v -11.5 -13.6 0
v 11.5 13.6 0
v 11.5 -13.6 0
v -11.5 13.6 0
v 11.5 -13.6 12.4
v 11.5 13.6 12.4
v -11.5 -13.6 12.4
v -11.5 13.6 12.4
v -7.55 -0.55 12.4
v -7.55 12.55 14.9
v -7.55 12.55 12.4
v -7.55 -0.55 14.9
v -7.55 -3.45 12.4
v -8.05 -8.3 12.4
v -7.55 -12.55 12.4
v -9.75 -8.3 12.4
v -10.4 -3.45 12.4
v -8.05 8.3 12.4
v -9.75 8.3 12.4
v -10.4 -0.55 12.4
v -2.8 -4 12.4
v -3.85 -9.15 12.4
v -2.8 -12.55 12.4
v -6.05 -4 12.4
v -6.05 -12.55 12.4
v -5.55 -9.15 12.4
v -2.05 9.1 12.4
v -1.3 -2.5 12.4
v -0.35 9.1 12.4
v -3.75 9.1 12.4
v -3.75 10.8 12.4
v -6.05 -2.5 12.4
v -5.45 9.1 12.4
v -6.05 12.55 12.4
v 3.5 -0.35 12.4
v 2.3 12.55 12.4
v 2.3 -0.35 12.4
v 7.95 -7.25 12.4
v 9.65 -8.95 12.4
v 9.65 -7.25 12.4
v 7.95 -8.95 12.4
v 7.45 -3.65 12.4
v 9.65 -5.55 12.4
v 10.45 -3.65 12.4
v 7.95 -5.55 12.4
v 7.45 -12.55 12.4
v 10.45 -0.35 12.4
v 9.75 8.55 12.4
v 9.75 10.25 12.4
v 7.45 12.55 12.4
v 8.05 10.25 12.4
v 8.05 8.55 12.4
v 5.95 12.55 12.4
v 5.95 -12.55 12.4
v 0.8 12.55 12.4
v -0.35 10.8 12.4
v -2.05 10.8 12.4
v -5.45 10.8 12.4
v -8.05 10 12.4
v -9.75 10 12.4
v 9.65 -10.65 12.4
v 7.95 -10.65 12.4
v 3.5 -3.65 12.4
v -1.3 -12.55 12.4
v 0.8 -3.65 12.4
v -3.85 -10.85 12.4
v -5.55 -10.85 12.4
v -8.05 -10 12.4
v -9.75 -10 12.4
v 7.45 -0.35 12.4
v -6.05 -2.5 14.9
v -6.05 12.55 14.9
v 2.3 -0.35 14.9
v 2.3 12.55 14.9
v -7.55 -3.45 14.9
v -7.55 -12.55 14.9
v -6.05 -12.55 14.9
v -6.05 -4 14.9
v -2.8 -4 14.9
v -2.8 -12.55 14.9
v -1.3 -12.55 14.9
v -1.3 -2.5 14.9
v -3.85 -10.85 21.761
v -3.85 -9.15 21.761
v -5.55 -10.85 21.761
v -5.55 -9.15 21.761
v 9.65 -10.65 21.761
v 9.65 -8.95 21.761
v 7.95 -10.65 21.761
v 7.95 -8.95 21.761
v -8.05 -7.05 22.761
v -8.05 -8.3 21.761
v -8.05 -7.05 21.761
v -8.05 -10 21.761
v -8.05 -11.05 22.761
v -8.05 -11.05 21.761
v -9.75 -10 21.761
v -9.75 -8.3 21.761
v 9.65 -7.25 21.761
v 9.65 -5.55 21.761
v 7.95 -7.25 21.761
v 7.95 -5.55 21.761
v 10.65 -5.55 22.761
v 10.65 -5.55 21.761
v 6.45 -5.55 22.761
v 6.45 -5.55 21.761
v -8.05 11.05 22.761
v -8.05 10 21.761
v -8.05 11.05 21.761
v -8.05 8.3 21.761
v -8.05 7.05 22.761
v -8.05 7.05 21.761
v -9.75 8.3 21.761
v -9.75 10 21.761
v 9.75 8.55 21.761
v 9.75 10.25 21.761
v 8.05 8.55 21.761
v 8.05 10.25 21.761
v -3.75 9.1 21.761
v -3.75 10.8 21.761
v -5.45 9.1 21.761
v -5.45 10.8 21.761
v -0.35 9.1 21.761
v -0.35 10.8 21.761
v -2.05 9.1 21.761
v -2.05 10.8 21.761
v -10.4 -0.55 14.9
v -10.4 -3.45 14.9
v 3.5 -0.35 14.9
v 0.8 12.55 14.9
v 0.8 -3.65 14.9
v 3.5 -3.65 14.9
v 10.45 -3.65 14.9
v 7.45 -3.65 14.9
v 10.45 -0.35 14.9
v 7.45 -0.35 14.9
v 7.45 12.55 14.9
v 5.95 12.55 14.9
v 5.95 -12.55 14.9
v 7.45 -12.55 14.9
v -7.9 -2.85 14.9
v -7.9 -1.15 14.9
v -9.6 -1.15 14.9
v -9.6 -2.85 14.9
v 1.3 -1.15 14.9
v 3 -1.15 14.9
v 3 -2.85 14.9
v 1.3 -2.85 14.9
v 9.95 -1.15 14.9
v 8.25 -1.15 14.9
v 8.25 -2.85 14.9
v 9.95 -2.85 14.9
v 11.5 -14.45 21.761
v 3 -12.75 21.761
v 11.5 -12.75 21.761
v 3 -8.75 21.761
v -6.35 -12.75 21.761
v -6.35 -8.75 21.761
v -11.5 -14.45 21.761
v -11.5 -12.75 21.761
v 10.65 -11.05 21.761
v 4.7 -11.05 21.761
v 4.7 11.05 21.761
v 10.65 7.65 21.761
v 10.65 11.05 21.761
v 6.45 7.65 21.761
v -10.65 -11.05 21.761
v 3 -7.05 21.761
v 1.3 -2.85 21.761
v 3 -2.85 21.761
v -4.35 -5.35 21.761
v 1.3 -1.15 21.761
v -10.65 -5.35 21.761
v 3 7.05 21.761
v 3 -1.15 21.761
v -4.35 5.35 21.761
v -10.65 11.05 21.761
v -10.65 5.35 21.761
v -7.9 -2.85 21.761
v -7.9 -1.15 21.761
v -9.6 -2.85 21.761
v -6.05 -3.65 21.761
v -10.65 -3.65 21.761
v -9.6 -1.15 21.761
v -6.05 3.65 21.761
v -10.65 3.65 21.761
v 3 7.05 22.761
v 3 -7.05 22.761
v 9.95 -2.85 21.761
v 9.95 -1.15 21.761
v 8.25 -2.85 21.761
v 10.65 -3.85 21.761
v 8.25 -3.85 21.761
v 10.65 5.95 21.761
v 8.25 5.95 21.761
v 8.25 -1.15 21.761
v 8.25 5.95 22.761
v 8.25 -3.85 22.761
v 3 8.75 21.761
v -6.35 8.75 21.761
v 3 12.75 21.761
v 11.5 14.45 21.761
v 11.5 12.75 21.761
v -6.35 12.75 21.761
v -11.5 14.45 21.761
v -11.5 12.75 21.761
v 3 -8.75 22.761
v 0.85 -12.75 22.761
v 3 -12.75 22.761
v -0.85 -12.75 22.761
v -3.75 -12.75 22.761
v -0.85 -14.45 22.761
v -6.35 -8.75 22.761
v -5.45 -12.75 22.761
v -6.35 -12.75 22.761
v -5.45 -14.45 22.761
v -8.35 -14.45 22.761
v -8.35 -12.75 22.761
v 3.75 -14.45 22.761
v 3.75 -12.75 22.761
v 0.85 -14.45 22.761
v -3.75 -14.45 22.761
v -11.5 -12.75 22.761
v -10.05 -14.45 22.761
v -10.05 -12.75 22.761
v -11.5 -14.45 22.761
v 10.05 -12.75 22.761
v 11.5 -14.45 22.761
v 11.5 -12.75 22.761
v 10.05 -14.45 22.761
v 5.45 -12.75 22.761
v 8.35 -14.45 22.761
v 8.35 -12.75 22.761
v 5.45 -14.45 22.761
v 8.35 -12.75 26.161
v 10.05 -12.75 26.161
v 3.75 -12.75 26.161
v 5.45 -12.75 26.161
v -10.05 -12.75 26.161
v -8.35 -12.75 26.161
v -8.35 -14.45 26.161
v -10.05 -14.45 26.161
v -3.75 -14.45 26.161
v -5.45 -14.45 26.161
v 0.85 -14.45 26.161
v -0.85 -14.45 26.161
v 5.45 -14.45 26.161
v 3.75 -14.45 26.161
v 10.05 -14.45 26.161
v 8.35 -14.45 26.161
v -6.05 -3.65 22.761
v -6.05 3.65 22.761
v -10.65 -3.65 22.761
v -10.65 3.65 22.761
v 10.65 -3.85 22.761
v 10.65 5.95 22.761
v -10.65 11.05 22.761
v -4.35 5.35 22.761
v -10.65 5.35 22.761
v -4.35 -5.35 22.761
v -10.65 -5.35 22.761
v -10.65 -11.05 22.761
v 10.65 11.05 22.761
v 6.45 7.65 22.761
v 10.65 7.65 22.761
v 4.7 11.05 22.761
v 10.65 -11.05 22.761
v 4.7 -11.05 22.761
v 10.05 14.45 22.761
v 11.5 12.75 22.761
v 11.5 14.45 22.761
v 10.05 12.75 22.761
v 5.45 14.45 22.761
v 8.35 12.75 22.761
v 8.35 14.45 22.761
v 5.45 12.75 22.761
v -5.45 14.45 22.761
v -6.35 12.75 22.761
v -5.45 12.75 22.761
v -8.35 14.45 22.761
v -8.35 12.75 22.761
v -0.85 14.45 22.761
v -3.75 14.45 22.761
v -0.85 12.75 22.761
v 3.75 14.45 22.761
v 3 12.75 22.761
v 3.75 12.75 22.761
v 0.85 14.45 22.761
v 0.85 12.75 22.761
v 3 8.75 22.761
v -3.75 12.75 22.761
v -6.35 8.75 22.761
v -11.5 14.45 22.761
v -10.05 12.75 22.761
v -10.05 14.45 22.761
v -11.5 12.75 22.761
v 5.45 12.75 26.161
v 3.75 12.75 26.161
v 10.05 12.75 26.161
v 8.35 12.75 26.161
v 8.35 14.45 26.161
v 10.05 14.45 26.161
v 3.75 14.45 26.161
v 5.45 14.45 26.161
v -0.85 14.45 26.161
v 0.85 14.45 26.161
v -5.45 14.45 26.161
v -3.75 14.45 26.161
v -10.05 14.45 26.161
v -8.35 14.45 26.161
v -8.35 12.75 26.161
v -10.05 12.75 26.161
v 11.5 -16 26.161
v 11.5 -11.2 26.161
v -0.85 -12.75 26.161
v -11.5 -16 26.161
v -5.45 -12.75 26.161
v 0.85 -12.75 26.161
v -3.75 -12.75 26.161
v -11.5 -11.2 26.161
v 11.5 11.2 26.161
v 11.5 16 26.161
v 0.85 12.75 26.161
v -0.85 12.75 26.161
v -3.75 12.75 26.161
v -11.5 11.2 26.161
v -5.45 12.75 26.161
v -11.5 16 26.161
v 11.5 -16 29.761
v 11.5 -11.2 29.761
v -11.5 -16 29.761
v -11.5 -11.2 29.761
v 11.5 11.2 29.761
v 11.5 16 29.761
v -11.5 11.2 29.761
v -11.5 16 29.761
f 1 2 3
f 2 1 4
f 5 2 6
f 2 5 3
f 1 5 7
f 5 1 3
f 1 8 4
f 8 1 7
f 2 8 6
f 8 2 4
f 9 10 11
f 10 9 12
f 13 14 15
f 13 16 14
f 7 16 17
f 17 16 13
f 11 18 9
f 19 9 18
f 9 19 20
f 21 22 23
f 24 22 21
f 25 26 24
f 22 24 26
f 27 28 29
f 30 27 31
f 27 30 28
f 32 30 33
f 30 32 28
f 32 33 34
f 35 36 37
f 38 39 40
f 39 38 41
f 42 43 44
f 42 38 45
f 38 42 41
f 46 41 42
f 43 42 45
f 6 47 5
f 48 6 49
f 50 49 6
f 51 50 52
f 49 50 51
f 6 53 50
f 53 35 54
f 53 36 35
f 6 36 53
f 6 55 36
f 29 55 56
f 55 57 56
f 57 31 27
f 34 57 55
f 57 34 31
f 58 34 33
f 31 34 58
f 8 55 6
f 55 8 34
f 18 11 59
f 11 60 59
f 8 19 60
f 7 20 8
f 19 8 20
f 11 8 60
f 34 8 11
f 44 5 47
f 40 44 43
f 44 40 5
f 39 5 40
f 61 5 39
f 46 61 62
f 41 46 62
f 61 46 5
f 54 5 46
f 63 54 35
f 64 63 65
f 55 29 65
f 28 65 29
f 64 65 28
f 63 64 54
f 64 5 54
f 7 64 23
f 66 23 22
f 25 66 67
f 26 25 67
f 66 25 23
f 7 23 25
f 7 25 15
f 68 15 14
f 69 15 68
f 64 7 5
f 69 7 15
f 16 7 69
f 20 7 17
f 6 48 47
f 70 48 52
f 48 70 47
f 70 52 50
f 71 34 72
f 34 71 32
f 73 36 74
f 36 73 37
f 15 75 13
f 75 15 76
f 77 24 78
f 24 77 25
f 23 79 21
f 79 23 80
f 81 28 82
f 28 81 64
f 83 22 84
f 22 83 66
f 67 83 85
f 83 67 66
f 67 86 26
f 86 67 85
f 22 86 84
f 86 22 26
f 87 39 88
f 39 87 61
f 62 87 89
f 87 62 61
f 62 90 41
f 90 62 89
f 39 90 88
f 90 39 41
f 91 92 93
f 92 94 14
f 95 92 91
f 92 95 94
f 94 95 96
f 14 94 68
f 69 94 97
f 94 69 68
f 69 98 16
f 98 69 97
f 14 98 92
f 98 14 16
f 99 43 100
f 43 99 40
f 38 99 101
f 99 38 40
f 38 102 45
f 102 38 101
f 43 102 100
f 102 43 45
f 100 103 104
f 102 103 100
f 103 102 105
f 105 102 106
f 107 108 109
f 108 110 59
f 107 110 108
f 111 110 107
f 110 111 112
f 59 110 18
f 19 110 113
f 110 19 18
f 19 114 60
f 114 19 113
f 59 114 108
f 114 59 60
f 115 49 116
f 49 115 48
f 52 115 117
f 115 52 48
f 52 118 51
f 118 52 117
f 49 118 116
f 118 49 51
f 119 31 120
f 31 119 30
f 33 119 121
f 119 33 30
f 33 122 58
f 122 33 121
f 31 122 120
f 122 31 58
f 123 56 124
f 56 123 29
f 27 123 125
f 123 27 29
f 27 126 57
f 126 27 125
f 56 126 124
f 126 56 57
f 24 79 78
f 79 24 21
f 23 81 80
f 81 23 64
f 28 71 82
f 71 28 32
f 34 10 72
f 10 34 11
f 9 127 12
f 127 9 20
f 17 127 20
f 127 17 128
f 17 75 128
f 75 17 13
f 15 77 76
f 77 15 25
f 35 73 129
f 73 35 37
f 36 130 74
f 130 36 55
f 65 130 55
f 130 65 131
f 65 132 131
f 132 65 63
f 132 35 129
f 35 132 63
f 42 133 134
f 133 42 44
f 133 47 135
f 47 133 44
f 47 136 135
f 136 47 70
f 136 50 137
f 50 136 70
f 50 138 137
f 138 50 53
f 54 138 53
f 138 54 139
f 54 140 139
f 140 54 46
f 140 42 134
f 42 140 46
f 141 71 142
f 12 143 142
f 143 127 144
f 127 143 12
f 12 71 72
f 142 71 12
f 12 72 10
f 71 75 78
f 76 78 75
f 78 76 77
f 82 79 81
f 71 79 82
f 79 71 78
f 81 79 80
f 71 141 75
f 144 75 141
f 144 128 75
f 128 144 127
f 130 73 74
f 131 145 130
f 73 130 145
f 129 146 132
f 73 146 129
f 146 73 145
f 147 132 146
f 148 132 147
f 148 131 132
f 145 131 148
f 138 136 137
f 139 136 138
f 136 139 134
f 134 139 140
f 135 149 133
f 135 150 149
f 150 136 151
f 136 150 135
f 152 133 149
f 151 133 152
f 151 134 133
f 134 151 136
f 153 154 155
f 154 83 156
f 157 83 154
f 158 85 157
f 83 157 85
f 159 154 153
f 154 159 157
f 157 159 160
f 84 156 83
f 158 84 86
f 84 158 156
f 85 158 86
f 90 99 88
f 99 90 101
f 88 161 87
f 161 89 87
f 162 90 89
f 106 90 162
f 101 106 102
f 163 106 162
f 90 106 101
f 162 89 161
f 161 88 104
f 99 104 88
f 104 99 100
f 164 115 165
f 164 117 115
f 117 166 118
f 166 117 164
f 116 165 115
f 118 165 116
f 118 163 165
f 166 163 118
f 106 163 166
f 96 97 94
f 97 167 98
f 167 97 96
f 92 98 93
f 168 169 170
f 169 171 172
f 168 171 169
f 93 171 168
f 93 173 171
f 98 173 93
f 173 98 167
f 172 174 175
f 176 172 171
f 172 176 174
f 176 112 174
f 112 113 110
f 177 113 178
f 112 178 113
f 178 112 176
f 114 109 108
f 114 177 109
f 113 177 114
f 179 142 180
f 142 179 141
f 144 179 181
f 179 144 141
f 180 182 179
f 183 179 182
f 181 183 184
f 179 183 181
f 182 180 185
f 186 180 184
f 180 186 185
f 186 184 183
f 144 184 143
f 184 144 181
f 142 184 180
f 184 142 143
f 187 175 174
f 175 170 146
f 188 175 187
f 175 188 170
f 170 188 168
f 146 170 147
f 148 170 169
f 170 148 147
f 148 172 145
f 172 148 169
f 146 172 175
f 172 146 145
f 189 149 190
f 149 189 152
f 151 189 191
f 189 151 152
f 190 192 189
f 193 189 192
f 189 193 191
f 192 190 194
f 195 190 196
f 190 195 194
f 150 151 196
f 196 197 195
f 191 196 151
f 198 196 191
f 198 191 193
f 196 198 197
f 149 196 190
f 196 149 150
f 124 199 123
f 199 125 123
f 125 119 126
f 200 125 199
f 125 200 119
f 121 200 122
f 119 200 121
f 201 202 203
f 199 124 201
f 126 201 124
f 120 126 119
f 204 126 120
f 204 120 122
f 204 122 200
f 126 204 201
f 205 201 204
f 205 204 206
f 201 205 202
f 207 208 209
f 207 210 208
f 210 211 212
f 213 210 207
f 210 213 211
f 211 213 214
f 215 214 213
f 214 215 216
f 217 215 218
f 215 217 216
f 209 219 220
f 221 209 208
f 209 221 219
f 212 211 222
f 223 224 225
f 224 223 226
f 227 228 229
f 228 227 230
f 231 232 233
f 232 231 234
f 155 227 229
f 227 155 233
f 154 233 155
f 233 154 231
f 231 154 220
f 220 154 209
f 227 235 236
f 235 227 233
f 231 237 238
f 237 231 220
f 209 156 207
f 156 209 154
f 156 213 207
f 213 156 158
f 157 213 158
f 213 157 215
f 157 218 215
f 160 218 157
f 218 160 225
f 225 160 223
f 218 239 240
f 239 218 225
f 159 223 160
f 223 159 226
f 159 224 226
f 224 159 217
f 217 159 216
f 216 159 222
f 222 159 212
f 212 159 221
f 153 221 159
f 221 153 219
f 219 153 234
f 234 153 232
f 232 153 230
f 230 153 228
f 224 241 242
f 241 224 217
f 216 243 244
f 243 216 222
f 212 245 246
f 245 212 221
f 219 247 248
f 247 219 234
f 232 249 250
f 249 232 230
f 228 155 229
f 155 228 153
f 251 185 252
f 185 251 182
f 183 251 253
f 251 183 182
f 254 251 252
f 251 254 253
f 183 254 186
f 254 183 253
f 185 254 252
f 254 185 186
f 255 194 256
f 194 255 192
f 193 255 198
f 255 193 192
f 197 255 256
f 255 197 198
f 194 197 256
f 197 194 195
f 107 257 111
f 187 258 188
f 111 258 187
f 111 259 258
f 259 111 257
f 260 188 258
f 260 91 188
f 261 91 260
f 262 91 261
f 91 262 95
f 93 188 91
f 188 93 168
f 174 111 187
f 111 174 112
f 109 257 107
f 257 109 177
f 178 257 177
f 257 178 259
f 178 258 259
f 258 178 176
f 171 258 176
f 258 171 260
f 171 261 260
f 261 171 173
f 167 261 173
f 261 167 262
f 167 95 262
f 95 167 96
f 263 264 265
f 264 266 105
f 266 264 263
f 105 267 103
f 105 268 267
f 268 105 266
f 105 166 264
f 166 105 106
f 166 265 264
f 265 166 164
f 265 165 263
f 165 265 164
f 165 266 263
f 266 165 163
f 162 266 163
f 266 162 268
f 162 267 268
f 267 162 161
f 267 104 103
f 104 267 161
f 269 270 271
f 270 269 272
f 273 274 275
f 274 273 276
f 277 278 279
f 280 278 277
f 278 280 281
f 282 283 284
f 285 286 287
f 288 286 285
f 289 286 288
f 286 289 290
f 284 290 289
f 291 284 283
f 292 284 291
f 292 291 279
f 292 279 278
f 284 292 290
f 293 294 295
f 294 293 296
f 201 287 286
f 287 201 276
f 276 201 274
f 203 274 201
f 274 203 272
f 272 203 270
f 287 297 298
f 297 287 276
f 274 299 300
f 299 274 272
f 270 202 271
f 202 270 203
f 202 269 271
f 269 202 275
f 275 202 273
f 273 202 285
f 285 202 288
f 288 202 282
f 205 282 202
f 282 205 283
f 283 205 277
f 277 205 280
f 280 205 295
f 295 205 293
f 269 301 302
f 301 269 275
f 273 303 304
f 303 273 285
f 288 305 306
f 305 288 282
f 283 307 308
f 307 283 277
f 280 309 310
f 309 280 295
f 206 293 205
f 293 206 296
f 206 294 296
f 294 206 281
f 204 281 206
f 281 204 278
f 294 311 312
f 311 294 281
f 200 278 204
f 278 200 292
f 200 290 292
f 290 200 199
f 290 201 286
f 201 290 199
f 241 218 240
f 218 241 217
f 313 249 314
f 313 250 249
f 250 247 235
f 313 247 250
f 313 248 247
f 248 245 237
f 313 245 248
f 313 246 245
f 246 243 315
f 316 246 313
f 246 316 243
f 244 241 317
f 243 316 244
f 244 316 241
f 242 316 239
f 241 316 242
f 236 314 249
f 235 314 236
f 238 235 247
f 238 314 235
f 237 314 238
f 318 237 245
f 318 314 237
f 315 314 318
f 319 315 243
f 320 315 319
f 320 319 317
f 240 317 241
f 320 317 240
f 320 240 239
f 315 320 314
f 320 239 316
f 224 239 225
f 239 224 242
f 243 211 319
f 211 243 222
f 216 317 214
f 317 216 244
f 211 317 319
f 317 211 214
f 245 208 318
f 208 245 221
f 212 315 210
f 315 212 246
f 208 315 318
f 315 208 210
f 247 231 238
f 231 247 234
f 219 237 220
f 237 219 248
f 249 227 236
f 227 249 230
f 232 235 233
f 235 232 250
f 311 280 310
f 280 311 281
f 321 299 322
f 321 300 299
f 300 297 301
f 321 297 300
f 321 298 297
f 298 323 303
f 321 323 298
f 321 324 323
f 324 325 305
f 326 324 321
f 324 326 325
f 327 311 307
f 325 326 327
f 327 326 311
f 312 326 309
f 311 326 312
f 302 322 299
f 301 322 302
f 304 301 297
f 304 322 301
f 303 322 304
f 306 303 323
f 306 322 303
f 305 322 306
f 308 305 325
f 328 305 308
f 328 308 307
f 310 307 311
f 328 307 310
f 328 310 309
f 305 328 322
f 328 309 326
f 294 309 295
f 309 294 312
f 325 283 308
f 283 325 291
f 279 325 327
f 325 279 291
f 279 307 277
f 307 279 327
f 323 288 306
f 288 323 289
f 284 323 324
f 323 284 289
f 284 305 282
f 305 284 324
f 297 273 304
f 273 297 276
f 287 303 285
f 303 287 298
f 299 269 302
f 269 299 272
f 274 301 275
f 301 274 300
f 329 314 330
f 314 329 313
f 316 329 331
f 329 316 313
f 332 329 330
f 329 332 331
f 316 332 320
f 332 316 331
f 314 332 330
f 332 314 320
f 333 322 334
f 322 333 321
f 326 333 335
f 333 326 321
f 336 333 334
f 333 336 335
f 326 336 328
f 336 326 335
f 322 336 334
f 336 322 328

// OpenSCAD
// Generated by SolidPython 0.4.2 on 2020-09-29 23:20:50
//!OpenSCAD

scale(v = 0.0100000000) {
	translate(v = [-1150, -1360, 0]) {
		union() {
			color(c = [0.4000000000, 0.4000000000, 0.4000000000]) {
				translate(v = [0, 0, 0]) {
					linear_extrude(height = 1000.0000000000) {
						polygon(paths = [[0, 1, 2, 3]], points = [[0, 0], [0, 2720], [2300, 2720], [2300, 0]]);
					}
				}
			}
			color(c = [0.2000000000, 0.6000000000, 0.2000000000]) {
				translate(v = [0, 0, 1000.0000000000]) {
					linear_extrude(height = 120.0000000000) {
						polygon(paths = [[0, 1, 2, 3]], points = [[0, 1305], [0, 2720], [2300, 2720], [2300, 1305]]);
					}
				}
			}
			color(c = [0.4000000000, 0.4000000000, 0.4000000000]) {
				translate(v = [0, 0, 1000.0000000000]) {
					linear_extrude(height = 120.0000000000) {
						polygon(paths = [[0, 1, 2, 3]], points = [[0, 0], [0, 1305], [2300, 1305], [2300, 0]]);
					}
				}
			}
			color(c = [0.9000000000, 0.6000000000, 0.6000000000]) {
				translate(v = [0, 0, 1120.0000000000]) {
					linear_extrude(height = 120.0000000000) {
						polygon(paths = [[0, 1, 2, 3]], points = [[135, 2065], [135, 2485], [395, 2485], [395, 2065]]);
					}
				}
			}
			color(c = [0.9000000000, 0.6000000000, 0.6000000000]) {
				translate(v = [0, 0, 1120.0000000000]) {
					linear_extrude(height = 120.0000000000) {
						polygon(paths = [[0, 1, 2, 3, 4, 5]], points = [[620, 1485], [620, 2065], [545, 2065], [545, 2485], [1230, 2485], [1230, 1485]]);
					}
				}
			}
			color(c = [0.9000000000, 0.6000000000, 0.6000000000]) {
				translate(v = [0, 0, 1120.0000000000]) {
					linear_extrude(height = 120.0000000000) {
						polygon(paths = [[0, 1, 2, 3]], points = [[1380, 1485], [1380, 2485], [1745, 2485], [1745, 1485]]);
					}
				}
			}
			color(c = [0.9000000000, 0.6000000000, 0.6000000000]) {
				translate(v = [0, 0, 1120.0000000000]) {
					linear_extrude(height = 120.0000000000) {
						polygon(paths = [[0, 1, 2, 3]], points = [[1895, 1485], [1895, 2485], [2165, 2485], [2165, 1485]]);
					}
				}
			}
			color(c = [0.9000000000, 0.6000000000, 0.9000000000]) {
				translate(v = [0, 0, 1120.0000000000]) {
					linear_extrude(height = 120.0000000000) {
						polygon(paths = [[0, 1, 2, 3]], points = [[135, 235], [135, 655], [395, 655], [395, 235]]);
					}
				}
			}
			color(c = [0.9000000000, 0.6000000000, 0.9000000000]) {
				translate(v = [0, 0, 1120.0000000000]) {
					linear_extrude(height = 120.0000000000) {
						polygon(paths = [[0, 1, 2, 3, 4, 5]], points = [[545, 235], [545, 655], [620, 655], [620, 885], [870, 885], [870, 235]]);
					}
				}
			}
			color(c = [0.9000000000, 0.6000000000, 0.9000000000]) {
				translate(v = [0, 0, 1120.0000000000]) {
					linear_extrude(height = 120.0000000000) {
						polygon(paths = [[0, 1, 2, 3]], points = [[1020, 235], [1020, 885], [1745, 885], [1745, 235]]);
					}
				}
			}
			color(c = [0.9000000000, 0.6000000000, 0.9000000000]) {
				translate(v = [0, 0, 1120.0000000000]) {
					linear_extrude(height = 120.0000000000) {
						polygon(paths = [[0, 1, 2, 3]], points = [[1895, 235], [1895, 885], [2165, 885], [2165, 235]]);
					}
				}
			}
			color(c = [0.2000000000, 0.6000000000, 0.2000000000]) {
				translate(v = [0, 0, 1120.0000000000]) {
					linear_extrude(height = 120.0000000000) {
						difference() {
							polygon(paths = [[0, 1, 2, 3]], points = [[0, 1305], [0, 2720], [2300, 2720], [2300, 1305]]);
							polygon(paths = [[0, 1, 2, 3]], points = [[1380, 1485], [1745, 1485], [1745, 2485], [1380, 2485]]);
							polygon(paths = [[0, 1, 2, 3]], points = [[1895, 1485], [2165, 1485], [2165, 2485], [1895, 2485]]);
							polygon(paths = [[0, 1, 2, 3]], points = [[135, 2065], [395, 2065], [395, 2485], [135, 2485]]);
							polygon(paths = [[0, 1, 2, 3, 4, 5]], points = [[620, 1485], [1230, 1485], [1230, 2485], [545, 2485], [545, 2065], [620, 2065]]);
						}
					}
				}
			}
			color(c = [0.4000000000, 0.4000000000, 0.4000000000]) {
				translate(v = [0, 0, 1120.0000000000]) {
					linear_extrude(height = 120.0000000000) {
						difference() {
							polygon(paths = [[0, 1, 2, 3]], points = [[0, 0], [0, 1305], [2300, 1305], [2300, 0]]);
							polygon(paths = [[0, 1, 2, 3]], points = [[135, 235], [395, 235], [395, 655], [135, 655]]);
							polygon(paths = [[0, 1, 2, 3]], points = [[1020, 235], [1745, 235], [1745, 885], [1020, 885]]);
							polygon(paths = [[0, 1, 2, 3]], points = [[1895, 235], [2165, 235], [2165, 885], [1895, 885]]);
							polygon(paths = [[0, 1, 2, 3, 4, 5]], points = [[545, 235], [870, 235], [870, 885], [620, 885], [620, 655], [545, 655]]);
						}
					}
				}
			}
			color(c = [0.1000000000, 0.1000000000, 0.1000000000]) {
				translate(v = [0, 0, 1240.0000000000]) {
					linear_extrude(height = 70.0000000000) {
						polygon(paths = [[0, 1, 2, 3]], points = [[595, 275], [595, 445], [765, 445], [765, 275]]);
					}
				}
			}
			color(c = [0.1000000000, 0.1000000000, 0.1000000000]) {
				translate(v = [0, 0, 1240.0000000000]) {
					linear_extrude(height = 70.0000000000) {
						polygon(paths = [[0, 1, 2, 3]], points = [[1945, 295], [1945, 465], [2115, 465], [2115, 295]]);
					}
				}
			}
			color(c = [0.1000000000, 0.1000000000, 0.1000000000]) {
				translate(v = [0, 0, 1240.0000000000]) {
					linear_extrude(height = 70.0000000000) {
						polygon(paths = [[0, 1, 2, 3]], points = [[175, 360], [175, 530], [345, 530], [345, 360]]);
					}
				}
			}
			color(c = [0.1000000000, 0.1000000000, 0.1000000000]) {
				translate(v = [0, 0, 1240.0000000000]) {
					linear_extrude(height = 70.0000000000) {
						polygon(paths = [[0, 1, 2, 3]], points = [[1945, 635], [1945, 805], [2115, 805], [2115, 635]]);
					}
				}
			}
			color(c = [0.1000000000, 0.1000000000, 0.1000000000]) {
				translate(v = [0, 0, 1240.0000000000]) {
					linear_extrude(height = 70.0000000000) {
						polygon(paths = [[0, 1, 2, 3]], points = [[175, 2190], [175, 2360], [345, 2360], [345, 2190]]);
					}
				}
			}
			color(c = [0.1000000000, 0.1000000000, 0.1000000000]) {
				translate(v = [0, 0, 1240.0000000000]) {
					linear_extrude(height = 70.0000000000) {
						polygon(paths = [[0, 1, 2, 3]], points = [[1955, 2215], [1955, 2385], [2125, 2385], [2125, 2215]]);
					}
				}
			}
			color(c = [0.1000000000, 0.1000000000, 0.1000000000]) {
				translate(v = [0, 0, 1240.0000000000]) {
					linear_extrude(height = 70.0000000000) {
						polygon(paths = [[0, 1, 2, 3]], points = [[605, 2270], [605, 2440], [775, 2440], [775, 2270]]);
					}
				}
			}
			color(c = [0.1000000000, 0.1000000000, 0.1000000000]) {
				translate(v = [0, 0, 1240.0000000000]) {
					linear_extrude(height = 70.0000000000) {
						polygon(paths = [[0, 1, 2, 3]], points = [[945, 2270], [945, 2440], [1115, 2440], [1115, 2270]]);
					}
				}
			}
			color(c = [1.0000000000, 1.0000000000, 1.0000000000]) {
				translate(v = [0, 0, 1240.0000000000]) {
					linear_extrude(height = 70.0000000000) {
						polygon(paths = [[0, 1, 2, 3, 4, 5, 6, 7, 8, 9, 10, 11, 12, 13]], points = [[395, 105], [395, 1015], [110, 1015], [110, 1305], [395, 1305], [395, 2615], [545, 2615], [545, 1110], [1020, 1110], [1020, 105], [870, 105], [870, 960], [545, 960], [545, 105]]);
					}
				}
			}
			color(c = [1.0000000000, 1.0000000000, 1.0000000000]) {
				translate(v = [0, 0, 1240.0000000000]) {
					linear_extrude(height = 70.0000000000) {
						polygon(paths = [[0, 1, 2, 3, 4, 5]], points = [[1230, 995], [1230, 2615], [1380, 2615], [1380, 1325], [1500, 1325], [1500, 995]]);
					}
				}
			}
			color(c = [1.0000000000, 1.0000000000, 1.0000000000]) {
				translate(v = [0, 0, 1240.0000000000]) {
					linear_extrude(height = 70.0000000000) {
						polygon(paths = [[0, 1, 2, 3, 4, 5, 6, 7]], points = [[1745, 105], [1745, 2615], [1895, 2615], [1895, 1325], [2195, 1325], [2195, 995], [1895, 995], [1895, 105]]);
					}
				}
			}
			color(c = [0.1000000000, 0.1000000000, 0.1000000000]) {
				translate(v = [0, 0, 1310.0000000000]) {
					linear_extrude(height = 180.0000000000) {
						polygon(paths = [[0, 1, 2, 3]], points = [[595, 275], [595, 445], [765, 445], [765, 275]]);
					}
				}
			}
			color(c = [0.1000000000, 0.1000000000, 0.1000000000]) {
				translate(v = [0, 0, 1310.0000000000]) {
					linear_extrude(height = 180.0000000000) {
						polygon(paths = [[0, 1, 2, 3]], points = [[1945, 295], [1945, 465], [2115, 465], [2115, 295]]);
					}
				}
			}
			color(c = [0.1000000000, 0.1000000000, 0.1000000000]) {
				translate(v = [0, 0, 1310.0000000000]) {
					linear_extrude(height = 180.0000000000) {
						polygon(paths = [[0, 1, 2, 3]], points = [[175, 360], [175, 530], [345, 530], [345, 360]]);
					}
				}
			}
			color(c = [0.1000000000, 0.1000000000, 0.1000000000]) {
				translate(v = [0, 0, 1310.0000000000]) {
					linear_extrude(height = 180.0000000000) {
						polygon(paths = [[0, 1, 2, 3]], points = [[1945, 635], [1945, 805], [2115, 805], [2115, 635]]);
					}
				}
			}
			color(c = [0.1000000000, 0.1000000000, 0.1000000000]) {
				translate(v = [0, 0, 1310.0000000000]) {
					linear_extrude(height = 180.0000000000) {
						polygon(paths = [[0, 1, 2, 3]], points = [[175, 2190], [175, 2360], [345, 2360], [345, 2190]]);
					}
				}
			}
			color(c = [0.1000000000, 0.1000000000, 0.1000000000]) {
				translate(v = [0, 0, 1310.0000000000]) {
					linear_extrude(height = 180.0000000000) {
						polygon(paths = [[0, 1, 2, 3]], points = [[1955, 2215], [1955, 2385], [2125, 2385], [2125, 2215]]);
					}
				}
			}
			color(c = [0.1000000000, 0.1000000000, 0.1000000000]) {
				translate(v = [0, 0, 1310.0000000000]) {
					linear_extrude(height = 180.0000000000) {
						polygon(paths = [[0, 1, 2, 3]], points = [[605, 2270], [605, 2440], [775, 2440], [775, 2270]]);
					}
				}
			}
			color(c = [0.1000000000, 0.1000000000, 0.1000000000]) {
				translate(v = [0, 0, 1310.0000000000]) {
					linear_extrude(height = 180.0000000000) {
						polygon(paths = [[0, 1, 2, 3]], points = [[945, 2270], [945, 2440], [1115, 2440], [1115, 2270]]);
					}
				}
			}
			color(c = [0.7000000000, 0, 0]) {
				translate(v = [0, 0, 1310.0000000000]) {
					linear_extrude(height = 180.0000000000) {
						polygon(paths = [[0, 1, 2, 3, 4, 5, 6, 7, 8, 9, 10, 11, 12, 13]], points = [[395, 105], [395, 1015], [110, 1015], [110, 1305], [395, 1305], [395, 2615], [545, 2615], [545, 1110], [1020, 1110], [1020, 105], [870, 105], [870, 960], [545, 960], [545, 105]]);
					}
				}
			}
			color(c = [0.7000000000, 0, 0]) {
				translate(v = [0, 0, 1310.0000000000]) {
					linear_extrude(height = 180.0000000000) {
						polygon(paths = [[0, 1, 2, 3, 4, 5]], points = [[1230, 995], [1230, 2615], [1380, 2615], [1380, 1325], [1500, 1325], [1500, 995]]);
					}
				}
			}
			color(c = [0.7000000000, 0, 0]) {
				translate(v = [0, 0, 1310.0000000000]) {
					linear_extrude(height = 180.0000000000) {
						polygon(paths = [[0, 1, 2, 3, 4, 5, 6, 7]], points = [[1745, 105], [1745, 2615], [1895, 2615], [1895, 1325], [2195, 1325], [2195, 995], [1895, 995], [1895, 105]]);
					}
				}
			}
			color(c = [0.1000000000, 0.1000000000, 0.1000000000]) {
				translate(v = [0, 0, 1490.0000000000]) {
					linear_extrude(height = 686.1000000000) {
						polygon(paths = [[0, 1, 2, 3]], points = [[595, 275], [595, 445], [765, 445], [765, 275]]);
					}
				}
			}
			color(c = [0.1000000000, 0.1000000000, 0.1000000000]) {
				translate(v = [0, 0, 1490.0000000000]) {
					linear_extrude(height = 686.1000000000) {
						polygon(paths = [[0, 1, 2, 3]], points = [[1945, 295], [1945, 465], [2115, 465], [2115, 295]]);
					}
				}
			}
			color(c = [0.1000000000, 0.1000000000, 0.1000000000]) {
				translate(v = [0, 0, 1490.0000000000]) {
					linear_extrude(height = 686.1000000000) {
						polygon(paths = [[0, 1, 2, 3]], points = [[175, 360], [175, 530], [345, 530], [345, 360]]);
					}
				}
			}
			color(c = [0.1000000000, 0.1000000000, 0.1000000000]) {
				translate(v = [0, 0, 1490.0000000000]) {
					linear_extrude(height = 686.1000000000) {
						polygon(paths = [[0, 1, 2, 3]], points = [[1945, 635], [1945, 805], [2115, 805], [2115, 635]]);
					}
				}
			}
			color(c = [0.1000000000, 0.1000000000, 0.1000000000]) {
				translate(v = [0, 0, 1490.0000000000]) {
					linear_extrude(height = 686.1000000000) {
						polygon(paths = [[0, 1, 2, 3]], points = [[190, 1075], [190, 1245], [360, 1245], [360, 1075]]);
					}
				}
			}
			color(c = [0.1000000000, 0.1000000000, 0.1000000000]) {
				translate(v = [0, 0, 1490.0000000000]) {
					linear_extrude(height = 686.1000000000) {
						polygon(paths = [[0, 1, 2, 3]], points = [[1280, 1075], [1280, 1245], [1450, 1245], [1450, 1075]]);
					}
				}
			}
			color(c = [0.1000000000, 0.1000000000, 0.1000000000]) {
				translate(v = [0, 0, 1490.0000000000]) {
					linear_extrude(height = 686.1000000000) {
						polygon(paths = [[0, 1, 2, 3]], points = [[1975, 1075], [1975, 1245], [2145, 1245], [2145, 1075]]);
					}
				}
			}
			color(c = [0.1000000000, 0.1000000000, 0.1000000000]) {
				translate(v = [0, 0, 1490.0000000000]) {
					linear_extrude(height = 686.1000000000) {
						polygon(paths = [[0, 1, 2, 3]], points = [[175, 2190], [175, 2360], [345, 2360], [345, 2190]]);
					}
				}
			}
			color(c = [0.1000000000, 0.1000000000, 0.1000000000]) {
				translate(v = [0, 0, 1490.0000000000]) {
					linear_extrude(height = 686.1000000000) {
						polygon(paths = [[0, 1, 2, 3]], points = [[1955, 2215], [1955, 2385], [2125, 2385], [2125, 2215]]);
					}
				}
			}
			color(c = [0.1000000000, 0.1000000000, 0.1000000000]) {
				translate(v = [0, 0, 1490.0000000000]) {
					linear_extrude(height = 686.1000000000) {
						polygon(paths = [[0, 1, 2, 3]], points = [[605, 2270], [605, 2440], [775, 2440], [775, 2270]]);
					}
				}
			}
			color(c = [0.1000000000, 0.1000000000, 0.1000000000]) {
				translate(v = [0, 0, 1490.0000000000]) {
					linear_extrude(height = 686.1000000000) {
						polygon(paths = [[0, 1, 2, 3]], points = [[945, 2270], [945, 2440], [1115, 2440], [1115, 2270]]);
					}
				}
			}
			color(c = [0.9000000000, 0.6000000000, 0.6000000000]) {
				translate(v = [0, 0, 2176.1000000000]) {
					linear_extrude(height = 100.0000000000) {
						polygon(paths = [[0, 1, 2, 3, 4, 5, 6, 7]], points = [[0, -85], [0, 85], [515, 85], [515, 485], [1450, 485], [1450, 85], [2300, 85], [2300, -85]]);
					}
				}
			}
			color(c = [0.9000000000, 0.6000000000, 0.6000000000]) {
				translate(v = [0, 0, 2176.1000000000]) {
					linear_extrude(height = 100.0000000000) {
						polygon(paths = [[0, 1, 2, 3]], points = [[85, 995], [85, 1725], [545, 1725], [545, 995]]);
					}
				}
			}
			color(c = [0.9000000000, 0.6000000000, 0.6000000000]) {
				translate(v = [0, 0, 2176.1000000000]) {
					linear_extrude(height = 100.0000000000) {
						polygon(paths = [[0, 1, 2, 3]], points = [[1975, 975], [1975, 1955], [2215, 1955], [2215, 975]]);
					}
				}
			}
			color(c = [0.9000000000, 0.6000000000, 0.6000000000]) {
				translate(v = [0, 0, 2176.1000000000]) {
					linear_extrude(height = 100.0000000000) {
						polygon(paths = [[0, 1, 2, 3, 4, 5, 6, 7, 8, 9, 10, 11]], points = [[85, 255], [85, 825], [715, 825], [715, 1895], [85, 1895], [85, 2465], [345, 2465], [345, 2065], [1450, 2065], [1450, 655], [345, 655], [345, 255]]);
					}
				}
			}
			color(c = [0.9000000000, 0.6000000000, 0.6000000000]) {
				translate(v = [0, 0, 2176.1000000000]) {
					linear_extrude(height = 100.0000000000) {
						polygon(paths = [[0, 1, 2, 3, 4, 5, 6, 7]], points = [[1620, 255], [1620, 2465], [2215, 2465], [2215, 2125], [1795, 2125], [1795, 805], [2215, 805], [2215, 255]]);
					}
				}
			}
			color(c = [0.9000000000, 0.6000000000, 0.6000000000]) {
				translate(v = [0, 0, 2176.1000000000]) {
					linear_extrude(height = 100.0000000000) {
						polygon(paths = [[0, 1, 2, 3, 4, 5, 6, 7]], points = [[515, 2235], [515, 2635], [0, 2635], [0, 2805], [2300, 2805], [2300, 2635], [1450, 2635], [1450, 2235]]);
					}
				}
			}
			color(c = [0.5000000000, 0.5000000000, 0.5000000000]) {
				translate(v = [0, 0, 2276.1000000000]) {
					linear_extrude(height = 340.0000000000) {
						polygon(paths = [[0, 1, 2, 3]], points = [[145, -85], [145, 85], [315, 85], [315, -85]]);
					}
				}
			}
			color(c = [0.5000000000, 0.5000000000, 0.5000000000]) {
				translate(v = [0, 0, 2276.1000000000]) {
					linear_extrude(height = 340.0000000000) {
						polygon(paths = [[0, 1, 2, 3]], points = [[605, -85], [605, 85], [775, 85], [775, -85]]);
					}
				}
			}
			color(c = [0.5000000000, 0.5000000000, 0.5000000000]) {
				translate(v = [0, 0, 2276.1000000000]) {
					linear_extrude(height = 340.0000000000) {
						polygon(paths = [[0, 1, 2, 3]], points = [[1065, -85], [1065, 85], [1235, 85], [1235, -85]]);
					}
				}
			}
			color(c = [0.5000000000, 0.5000000000, 0.5000000000]) {
				translate(v = [0, 0, 2276.1000000000]) {
					linear_extrude(height = 340.0000000000) {
						polygon(paths = [[0, 1, 2, 3]], points = [[1525, -85], [1525, 85], [1695, 85], [1695, -85]]);
					}
				}
			}
			color(c = [0.5000000000, 0.5000000000, 0.5000000000]) {
				translate(v = [0, 0, 2276.1000000000]) {
					linear_extrude(height = 340.0000000000) {
						polygon(paths = [[0, 1, 2, 3]], points = [[1985, -85], [1985, 85], [2155, 85], [2155, -85]]);
					}
				}
			}
			color(c = [0.5000000000, 0.5000000000, 0.5000000000]) {
				translate(v = [0, 0, 2276.1000000000]) {
					linear_extrude(height = 340.0000000000) {
						polygon(paths = [[0, 1, 2, 3]], points = [[145, 2635], [145, 2805], [315, 2805], [315, 2635]]);
					}
				}
			}
			color(c = [0.5000000000, 0.5000000000, 0.5000000000]) {
				translate(v = [0, 0, 2276.1000000000]) {
					linear_extrude(height = 340.0000000000) {
						polygon(paths = [[0, 1, 2, 3]], points = [[605, 2635], [605, 2805], [775, 2805], [775, 2635]]);
					}
				}
			}
			color(c = [0.5000000000, 0.5000000000, 0.5000000000]) {
				translate(v = [0, 0, 2276.1000000000]) {
					linear_extrude(height = 340.0000000000) {
						polygon(paths = [[0, 1, 2, 3]], points = [[1065, 2635], [1065, 2805], [1235, 2805], [1235, 2635]]);
					}
				}
			}
			color(c = [0.5000000000, 0.5000000000, 0.5000000000]) {
				translate(v = [0, 0, 2276.1000000000]) {
					linear_extrude(height = 340.0000000000) {
						polygon(paths = [[0, 1, 2, 3]], points = [[1525, 2635], [1525, 2805], [1695, 2805], [1695, 2635]]);
					}
				}
			}
			color(c = [0.5000000000, 0.5000000000, 0.5000000000]) {
				translate(v = [0, 0, 2276.1000000000]) {
					linear_extrude(height = 340.0000000000) {
						polygon(paths = [[0, 1, 2, 3]], points = [[1985, 2635], [1985, 2805], [2155, 2805], [2155, 2635]]);
					}
				}
			}
			color(c = [0.3000000000, 0.3000000000, 1]) {
				translate(v = [0, 0, 2616.1000000000]) {
					linear_extrude(height = 360.0000000000) {
						polygon(paths = [[0, 1, 2, 3]], points = [[0, -240], [0, 240], [2300, 240], [2300, -240]]);
					}
				}
			}
			color(c = [0.3000000000, 0.3000000000, 1]) {
				translate(v = [0, 0, 2616.1000000000]) {
					linear_extrude(height = 360.0000000000) {
						polygon(paths = [[0, 1, 2, 3]], points = [[0, 2480], [0, 2960], [2300, 2960], [2300, 2480]]);
					}
				}
			}
		}
	}
}
